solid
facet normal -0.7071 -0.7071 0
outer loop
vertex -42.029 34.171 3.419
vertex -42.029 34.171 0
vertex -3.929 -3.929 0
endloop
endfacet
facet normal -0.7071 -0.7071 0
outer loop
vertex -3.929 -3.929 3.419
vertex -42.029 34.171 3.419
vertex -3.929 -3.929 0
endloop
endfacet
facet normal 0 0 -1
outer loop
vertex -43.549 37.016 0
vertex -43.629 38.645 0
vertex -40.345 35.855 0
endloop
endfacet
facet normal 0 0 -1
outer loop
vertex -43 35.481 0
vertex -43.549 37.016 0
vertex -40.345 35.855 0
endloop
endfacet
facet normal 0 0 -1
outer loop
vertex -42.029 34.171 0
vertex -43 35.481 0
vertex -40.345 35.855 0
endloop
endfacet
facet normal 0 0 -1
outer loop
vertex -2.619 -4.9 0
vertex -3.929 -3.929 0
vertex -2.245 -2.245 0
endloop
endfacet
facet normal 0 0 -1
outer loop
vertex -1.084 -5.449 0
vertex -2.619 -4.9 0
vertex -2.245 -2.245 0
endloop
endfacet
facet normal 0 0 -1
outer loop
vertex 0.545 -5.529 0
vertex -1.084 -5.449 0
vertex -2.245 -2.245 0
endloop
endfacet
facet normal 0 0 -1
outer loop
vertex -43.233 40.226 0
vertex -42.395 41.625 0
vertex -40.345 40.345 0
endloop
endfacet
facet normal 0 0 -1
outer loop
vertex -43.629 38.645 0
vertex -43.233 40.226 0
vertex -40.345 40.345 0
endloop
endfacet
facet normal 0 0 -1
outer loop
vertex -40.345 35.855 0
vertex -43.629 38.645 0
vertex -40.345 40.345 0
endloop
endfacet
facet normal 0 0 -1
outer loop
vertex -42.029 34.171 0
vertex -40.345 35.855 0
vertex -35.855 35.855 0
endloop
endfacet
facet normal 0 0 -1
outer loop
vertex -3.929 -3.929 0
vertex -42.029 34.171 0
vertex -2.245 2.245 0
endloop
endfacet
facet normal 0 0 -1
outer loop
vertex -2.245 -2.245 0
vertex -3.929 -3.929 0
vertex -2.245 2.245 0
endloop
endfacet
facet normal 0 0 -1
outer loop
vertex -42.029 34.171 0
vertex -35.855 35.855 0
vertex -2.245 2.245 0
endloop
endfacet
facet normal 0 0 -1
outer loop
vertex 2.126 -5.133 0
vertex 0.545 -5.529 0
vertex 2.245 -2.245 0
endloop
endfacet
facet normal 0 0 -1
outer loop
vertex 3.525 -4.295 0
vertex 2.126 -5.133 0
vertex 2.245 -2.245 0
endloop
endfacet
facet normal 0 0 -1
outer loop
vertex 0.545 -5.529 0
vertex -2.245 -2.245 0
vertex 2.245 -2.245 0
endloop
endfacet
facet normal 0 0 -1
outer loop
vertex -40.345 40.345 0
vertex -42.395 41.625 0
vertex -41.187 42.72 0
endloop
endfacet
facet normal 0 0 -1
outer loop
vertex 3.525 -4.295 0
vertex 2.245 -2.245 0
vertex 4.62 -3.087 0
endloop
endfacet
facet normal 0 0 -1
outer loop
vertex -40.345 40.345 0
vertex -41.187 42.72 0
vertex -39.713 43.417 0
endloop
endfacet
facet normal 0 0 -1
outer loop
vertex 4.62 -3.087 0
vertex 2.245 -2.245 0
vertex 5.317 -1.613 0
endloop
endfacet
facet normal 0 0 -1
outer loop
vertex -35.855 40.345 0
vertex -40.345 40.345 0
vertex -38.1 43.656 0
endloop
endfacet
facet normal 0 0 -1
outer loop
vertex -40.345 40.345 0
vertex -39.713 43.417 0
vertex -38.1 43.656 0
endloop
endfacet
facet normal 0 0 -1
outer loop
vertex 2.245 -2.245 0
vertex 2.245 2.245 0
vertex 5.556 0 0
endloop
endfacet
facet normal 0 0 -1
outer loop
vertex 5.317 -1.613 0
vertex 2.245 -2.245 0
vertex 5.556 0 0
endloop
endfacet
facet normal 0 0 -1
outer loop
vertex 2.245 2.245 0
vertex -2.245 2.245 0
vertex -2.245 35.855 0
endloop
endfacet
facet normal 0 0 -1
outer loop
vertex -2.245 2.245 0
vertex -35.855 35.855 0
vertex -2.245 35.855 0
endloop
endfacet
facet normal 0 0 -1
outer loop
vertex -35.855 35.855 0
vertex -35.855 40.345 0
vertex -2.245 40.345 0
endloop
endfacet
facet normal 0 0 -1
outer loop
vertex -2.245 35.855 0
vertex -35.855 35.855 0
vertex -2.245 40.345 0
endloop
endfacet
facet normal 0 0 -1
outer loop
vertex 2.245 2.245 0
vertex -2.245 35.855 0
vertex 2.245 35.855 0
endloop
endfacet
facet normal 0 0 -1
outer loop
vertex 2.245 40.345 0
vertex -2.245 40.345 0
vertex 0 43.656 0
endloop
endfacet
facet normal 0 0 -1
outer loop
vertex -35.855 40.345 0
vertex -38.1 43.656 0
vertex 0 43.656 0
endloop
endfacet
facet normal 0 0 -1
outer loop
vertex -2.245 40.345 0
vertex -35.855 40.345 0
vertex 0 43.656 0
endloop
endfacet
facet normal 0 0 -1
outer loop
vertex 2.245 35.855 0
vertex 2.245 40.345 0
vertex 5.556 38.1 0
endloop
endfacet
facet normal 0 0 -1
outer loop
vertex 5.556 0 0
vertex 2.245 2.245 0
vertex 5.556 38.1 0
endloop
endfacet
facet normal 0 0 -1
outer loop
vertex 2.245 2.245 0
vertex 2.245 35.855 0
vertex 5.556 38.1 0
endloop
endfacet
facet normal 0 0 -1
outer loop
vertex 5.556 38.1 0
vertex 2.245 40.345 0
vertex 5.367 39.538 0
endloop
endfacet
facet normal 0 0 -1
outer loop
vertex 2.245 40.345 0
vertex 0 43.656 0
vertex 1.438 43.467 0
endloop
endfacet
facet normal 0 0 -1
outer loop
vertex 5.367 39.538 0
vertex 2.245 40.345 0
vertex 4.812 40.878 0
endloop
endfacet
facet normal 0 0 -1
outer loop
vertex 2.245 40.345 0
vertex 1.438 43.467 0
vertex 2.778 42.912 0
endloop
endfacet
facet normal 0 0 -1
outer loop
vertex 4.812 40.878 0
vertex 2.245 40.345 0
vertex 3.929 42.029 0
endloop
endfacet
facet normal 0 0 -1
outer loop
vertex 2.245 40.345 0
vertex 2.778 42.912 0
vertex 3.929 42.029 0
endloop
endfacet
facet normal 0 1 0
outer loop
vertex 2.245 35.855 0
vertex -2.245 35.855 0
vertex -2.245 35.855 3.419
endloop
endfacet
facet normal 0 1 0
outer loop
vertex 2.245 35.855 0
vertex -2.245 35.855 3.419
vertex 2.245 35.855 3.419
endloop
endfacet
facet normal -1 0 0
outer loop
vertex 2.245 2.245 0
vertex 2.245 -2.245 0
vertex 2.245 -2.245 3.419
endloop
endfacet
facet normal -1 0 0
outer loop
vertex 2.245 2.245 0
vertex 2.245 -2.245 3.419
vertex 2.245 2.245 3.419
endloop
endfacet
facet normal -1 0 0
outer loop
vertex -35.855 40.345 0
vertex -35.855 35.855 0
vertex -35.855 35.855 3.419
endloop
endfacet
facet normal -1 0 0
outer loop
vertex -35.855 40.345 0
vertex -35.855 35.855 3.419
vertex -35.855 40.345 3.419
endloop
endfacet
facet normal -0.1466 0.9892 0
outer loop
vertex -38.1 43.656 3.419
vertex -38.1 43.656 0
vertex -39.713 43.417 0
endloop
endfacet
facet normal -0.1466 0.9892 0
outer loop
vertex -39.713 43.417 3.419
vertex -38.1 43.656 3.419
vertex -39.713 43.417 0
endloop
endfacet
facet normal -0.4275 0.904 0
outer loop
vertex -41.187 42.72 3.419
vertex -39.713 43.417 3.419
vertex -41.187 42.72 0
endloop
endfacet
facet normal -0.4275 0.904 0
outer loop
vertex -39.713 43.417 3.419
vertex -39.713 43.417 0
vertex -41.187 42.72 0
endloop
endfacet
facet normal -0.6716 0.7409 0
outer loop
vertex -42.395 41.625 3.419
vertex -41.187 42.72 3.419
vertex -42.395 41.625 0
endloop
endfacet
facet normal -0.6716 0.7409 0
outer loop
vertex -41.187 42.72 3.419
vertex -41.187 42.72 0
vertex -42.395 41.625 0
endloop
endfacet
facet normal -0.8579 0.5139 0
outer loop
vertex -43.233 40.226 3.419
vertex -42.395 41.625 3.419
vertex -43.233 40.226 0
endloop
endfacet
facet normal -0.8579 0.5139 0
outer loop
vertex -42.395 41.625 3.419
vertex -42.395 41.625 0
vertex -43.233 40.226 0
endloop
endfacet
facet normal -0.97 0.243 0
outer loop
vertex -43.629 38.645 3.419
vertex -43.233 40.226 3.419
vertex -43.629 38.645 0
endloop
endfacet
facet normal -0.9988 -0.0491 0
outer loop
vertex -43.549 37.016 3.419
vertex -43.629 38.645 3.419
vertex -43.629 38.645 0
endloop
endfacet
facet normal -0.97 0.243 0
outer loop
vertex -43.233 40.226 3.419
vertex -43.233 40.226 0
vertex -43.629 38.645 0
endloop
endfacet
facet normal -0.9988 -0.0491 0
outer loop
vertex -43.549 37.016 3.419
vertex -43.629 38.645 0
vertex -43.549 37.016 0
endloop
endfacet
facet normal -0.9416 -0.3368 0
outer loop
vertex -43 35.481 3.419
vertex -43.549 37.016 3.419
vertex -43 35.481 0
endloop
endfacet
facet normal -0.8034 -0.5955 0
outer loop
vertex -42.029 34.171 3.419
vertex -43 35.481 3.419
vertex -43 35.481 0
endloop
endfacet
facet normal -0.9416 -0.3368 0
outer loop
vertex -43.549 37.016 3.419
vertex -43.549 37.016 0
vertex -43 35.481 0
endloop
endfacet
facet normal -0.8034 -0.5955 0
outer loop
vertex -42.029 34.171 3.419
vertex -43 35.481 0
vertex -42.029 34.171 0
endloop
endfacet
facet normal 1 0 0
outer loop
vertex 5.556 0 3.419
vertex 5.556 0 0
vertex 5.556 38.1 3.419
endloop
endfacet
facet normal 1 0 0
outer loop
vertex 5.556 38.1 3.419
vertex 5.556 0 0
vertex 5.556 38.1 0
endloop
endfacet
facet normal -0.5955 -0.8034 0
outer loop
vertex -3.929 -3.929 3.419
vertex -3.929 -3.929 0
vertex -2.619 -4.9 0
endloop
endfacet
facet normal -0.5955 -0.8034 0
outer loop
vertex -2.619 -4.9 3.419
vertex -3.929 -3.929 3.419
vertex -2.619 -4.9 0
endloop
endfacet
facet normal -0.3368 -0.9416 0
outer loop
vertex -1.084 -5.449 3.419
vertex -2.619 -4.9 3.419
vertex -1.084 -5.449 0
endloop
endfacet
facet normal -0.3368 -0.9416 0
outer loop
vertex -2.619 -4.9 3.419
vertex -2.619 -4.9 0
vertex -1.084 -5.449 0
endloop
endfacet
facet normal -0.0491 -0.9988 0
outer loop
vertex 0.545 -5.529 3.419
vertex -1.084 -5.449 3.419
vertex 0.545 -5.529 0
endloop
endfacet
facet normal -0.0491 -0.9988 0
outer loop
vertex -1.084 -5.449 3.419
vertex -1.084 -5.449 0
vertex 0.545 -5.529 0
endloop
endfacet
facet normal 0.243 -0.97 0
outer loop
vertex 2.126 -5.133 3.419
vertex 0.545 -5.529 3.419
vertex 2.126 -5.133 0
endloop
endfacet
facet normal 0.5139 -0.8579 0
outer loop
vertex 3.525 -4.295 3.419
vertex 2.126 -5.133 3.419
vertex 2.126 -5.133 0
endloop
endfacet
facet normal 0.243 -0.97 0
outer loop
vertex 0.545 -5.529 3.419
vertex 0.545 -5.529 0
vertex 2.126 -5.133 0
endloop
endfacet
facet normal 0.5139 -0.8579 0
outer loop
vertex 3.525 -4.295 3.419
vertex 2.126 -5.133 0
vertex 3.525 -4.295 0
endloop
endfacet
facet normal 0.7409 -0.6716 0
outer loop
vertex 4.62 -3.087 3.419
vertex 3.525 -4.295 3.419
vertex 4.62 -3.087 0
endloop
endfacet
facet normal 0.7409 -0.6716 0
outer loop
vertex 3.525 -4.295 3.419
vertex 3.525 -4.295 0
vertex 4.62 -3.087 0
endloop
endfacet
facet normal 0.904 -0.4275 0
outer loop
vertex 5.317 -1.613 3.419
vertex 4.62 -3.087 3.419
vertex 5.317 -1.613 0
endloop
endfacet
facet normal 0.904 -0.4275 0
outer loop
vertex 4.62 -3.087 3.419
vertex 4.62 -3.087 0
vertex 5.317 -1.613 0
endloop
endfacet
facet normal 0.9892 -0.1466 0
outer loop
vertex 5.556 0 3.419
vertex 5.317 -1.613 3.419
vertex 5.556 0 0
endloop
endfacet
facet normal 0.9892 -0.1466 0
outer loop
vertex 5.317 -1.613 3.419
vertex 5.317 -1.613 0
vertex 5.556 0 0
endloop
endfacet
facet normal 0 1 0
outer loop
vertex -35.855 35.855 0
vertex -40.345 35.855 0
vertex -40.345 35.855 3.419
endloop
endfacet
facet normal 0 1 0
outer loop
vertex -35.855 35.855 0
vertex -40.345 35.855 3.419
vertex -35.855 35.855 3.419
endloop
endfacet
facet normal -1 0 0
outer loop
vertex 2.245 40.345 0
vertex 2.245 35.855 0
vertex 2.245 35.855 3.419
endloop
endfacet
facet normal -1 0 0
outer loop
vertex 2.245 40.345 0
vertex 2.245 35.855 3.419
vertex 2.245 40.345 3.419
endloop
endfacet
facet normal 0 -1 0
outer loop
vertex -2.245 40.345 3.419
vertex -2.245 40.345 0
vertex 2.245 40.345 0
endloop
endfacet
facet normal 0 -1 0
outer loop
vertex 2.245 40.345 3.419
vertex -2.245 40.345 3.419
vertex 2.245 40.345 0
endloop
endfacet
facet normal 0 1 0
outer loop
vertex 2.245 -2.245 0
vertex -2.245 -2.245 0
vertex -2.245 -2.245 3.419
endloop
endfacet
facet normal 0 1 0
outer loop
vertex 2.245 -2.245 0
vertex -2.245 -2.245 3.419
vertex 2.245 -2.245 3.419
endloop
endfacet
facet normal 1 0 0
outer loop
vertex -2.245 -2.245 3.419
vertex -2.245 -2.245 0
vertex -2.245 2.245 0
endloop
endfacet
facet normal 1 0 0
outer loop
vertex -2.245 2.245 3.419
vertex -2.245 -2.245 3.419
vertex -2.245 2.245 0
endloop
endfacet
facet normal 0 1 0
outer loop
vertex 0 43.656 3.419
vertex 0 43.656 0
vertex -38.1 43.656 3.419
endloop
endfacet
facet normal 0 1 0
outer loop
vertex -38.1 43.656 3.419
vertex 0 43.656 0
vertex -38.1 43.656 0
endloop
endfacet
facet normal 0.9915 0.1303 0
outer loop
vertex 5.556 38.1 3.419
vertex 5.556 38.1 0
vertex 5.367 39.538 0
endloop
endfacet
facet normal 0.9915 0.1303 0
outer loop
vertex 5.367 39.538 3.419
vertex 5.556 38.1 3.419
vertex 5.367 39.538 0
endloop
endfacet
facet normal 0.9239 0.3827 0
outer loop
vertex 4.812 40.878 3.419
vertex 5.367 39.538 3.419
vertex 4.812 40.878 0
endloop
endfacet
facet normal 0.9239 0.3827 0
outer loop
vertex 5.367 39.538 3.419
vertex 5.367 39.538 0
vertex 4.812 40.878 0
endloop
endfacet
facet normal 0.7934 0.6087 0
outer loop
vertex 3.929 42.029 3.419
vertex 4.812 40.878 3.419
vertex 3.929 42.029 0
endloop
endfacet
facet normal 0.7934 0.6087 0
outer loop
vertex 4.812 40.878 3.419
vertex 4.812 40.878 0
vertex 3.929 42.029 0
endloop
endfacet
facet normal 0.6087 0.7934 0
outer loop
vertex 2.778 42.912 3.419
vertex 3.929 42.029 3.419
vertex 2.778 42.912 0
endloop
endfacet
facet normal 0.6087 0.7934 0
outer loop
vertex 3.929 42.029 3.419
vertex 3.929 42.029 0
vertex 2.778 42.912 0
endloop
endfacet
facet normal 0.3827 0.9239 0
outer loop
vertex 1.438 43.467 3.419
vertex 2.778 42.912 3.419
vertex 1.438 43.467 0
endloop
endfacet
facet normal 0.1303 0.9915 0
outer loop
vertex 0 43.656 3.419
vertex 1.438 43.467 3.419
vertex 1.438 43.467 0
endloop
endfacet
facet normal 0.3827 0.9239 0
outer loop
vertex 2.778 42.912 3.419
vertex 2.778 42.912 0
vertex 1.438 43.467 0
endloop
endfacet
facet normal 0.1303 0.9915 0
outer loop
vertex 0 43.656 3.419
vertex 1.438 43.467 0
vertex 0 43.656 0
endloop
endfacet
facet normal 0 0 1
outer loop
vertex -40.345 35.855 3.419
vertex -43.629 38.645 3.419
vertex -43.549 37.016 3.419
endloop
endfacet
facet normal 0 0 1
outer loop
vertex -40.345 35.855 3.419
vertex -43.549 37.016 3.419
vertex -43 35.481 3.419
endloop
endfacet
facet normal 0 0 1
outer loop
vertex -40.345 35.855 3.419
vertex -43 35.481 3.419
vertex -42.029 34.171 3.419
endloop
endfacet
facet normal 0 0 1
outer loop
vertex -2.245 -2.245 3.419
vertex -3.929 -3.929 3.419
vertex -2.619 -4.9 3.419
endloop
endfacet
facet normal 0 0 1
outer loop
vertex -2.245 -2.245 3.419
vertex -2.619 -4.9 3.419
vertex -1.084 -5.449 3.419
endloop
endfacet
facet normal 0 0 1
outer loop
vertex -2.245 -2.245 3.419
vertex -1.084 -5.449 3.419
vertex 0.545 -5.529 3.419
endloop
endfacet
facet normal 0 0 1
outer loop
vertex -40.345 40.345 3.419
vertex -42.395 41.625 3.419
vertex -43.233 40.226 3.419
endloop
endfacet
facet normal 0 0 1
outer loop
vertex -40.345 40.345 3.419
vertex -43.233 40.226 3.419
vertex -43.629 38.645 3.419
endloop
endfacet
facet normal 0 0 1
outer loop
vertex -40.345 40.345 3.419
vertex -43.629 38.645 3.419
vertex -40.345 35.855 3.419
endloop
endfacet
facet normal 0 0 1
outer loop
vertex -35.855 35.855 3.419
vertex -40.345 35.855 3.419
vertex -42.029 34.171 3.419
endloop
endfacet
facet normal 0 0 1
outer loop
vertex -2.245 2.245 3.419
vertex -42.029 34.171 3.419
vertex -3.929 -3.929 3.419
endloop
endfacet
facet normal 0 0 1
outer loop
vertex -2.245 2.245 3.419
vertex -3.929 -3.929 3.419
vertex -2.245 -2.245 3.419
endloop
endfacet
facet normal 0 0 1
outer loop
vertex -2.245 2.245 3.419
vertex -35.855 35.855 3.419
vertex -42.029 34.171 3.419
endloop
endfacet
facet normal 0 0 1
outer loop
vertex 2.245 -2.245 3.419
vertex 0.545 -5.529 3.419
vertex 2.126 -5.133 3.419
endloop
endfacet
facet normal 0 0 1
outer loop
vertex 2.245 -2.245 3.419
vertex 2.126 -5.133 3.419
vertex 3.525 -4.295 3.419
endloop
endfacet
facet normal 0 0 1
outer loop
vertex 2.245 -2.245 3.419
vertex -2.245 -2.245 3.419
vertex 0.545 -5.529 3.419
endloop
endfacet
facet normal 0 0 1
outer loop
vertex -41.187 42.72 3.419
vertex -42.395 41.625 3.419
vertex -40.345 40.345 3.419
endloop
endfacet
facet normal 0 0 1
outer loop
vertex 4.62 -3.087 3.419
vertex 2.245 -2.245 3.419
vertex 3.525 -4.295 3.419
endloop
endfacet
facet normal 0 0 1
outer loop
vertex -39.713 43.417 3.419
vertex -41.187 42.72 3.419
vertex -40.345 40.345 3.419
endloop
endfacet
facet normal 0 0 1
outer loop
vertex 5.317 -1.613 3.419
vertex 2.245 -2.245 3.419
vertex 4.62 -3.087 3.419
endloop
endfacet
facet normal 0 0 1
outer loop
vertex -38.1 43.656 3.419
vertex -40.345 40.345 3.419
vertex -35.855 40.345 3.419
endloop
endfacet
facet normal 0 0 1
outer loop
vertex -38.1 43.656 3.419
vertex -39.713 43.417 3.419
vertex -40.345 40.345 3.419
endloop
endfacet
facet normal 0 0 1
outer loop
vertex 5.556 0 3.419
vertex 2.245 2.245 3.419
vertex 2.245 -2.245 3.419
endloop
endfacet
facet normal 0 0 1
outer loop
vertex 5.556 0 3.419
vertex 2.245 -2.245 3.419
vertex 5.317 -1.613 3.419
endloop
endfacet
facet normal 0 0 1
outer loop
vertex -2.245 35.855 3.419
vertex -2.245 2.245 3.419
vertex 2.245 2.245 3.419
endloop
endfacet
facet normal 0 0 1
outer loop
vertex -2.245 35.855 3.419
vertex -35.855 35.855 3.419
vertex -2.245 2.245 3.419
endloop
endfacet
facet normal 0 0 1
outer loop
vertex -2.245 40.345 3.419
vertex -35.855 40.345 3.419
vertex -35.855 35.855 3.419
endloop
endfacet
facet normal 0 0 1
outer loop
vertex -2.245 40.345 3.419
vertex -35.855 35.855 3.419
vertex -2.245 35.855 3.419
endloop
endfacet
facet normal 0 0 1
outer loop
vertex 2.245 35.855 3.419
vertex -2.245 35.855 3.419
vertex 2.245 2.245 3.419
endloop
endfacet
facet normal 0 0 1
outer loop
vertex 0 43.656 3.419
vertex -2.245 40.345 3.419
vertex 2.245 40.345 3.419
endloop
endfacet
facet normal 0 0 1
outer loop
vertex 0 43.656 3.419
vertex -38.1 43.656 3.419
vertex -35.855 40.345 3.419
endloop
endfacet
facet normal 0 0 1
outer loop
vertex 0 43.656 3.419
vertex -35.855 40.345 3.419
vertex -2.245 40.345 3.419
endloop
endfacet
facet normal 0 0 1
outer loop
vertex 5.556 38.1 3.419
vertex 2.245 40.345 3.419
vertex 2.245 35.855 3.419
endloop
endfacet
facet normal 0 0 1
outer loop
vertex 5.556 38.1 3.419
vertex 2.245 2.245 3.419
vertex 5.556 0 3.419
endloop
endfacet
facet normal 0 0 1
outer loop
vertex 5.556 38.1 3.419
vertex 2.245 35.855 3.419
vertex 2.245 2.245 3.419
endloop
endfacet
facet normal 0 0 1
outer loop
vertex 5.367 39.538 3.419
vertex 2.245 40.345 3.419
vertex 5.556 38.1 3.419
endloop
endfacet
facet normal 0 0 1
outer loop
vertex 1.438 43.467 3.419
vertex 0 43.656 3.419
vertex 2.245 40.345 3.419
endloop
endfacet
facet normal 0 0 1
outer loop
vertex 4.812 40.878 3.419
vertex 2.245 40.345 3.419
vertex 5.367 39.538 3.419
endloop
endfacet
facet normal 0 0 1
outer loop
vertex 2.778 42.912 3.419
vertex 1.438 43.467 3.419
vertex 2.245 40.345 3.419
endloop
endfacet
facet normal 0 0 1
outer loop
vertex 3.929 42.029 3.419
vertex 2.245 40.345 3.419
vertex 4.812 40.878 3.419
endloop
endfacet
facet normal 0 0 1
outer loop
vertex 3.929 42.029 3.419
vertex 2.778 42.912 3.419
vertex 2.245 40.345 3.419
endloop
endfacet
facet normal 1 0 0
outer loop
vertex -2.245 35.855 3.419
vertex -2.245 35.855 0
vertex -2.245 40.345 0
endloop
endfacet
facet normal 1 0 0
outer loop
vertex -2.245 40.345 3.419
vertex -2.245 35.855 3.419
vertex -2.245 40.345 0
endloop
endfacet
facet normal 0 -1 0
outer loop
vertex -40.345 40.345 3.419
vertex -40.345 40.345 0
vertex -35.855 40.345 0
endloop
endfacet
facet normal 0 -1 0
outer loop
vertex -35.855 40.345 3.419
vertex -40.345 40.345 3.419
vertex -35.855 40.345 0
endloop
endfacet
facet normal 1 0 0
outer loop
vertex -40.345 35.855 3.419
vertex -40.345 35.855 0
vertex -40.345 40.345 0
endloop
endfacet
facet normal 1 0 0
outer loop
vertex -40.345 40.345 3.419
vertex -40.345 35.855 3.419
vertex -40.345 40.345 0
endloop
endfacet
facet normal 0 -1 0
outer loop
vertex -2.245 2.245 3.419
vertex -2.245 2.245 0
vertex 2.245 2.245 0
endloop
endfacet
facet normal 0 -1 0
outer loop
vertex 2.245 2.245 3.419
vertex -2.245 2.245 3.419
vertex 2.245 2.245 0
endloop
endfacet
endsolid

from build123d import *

# Parameters (mm, degrees)
F0_W     = 4.490128
F0_H     = 4.490128
F1_DEPTH = 3.41884


with BuildPart() as f1:
    # F0 (on Top) → F1 (new body)
    with BuildSketch(Plane.XY):
        with BuildLine():
            Line((5.55625, 0), (5.55625, 38.1))
            ThreePointArc((5.55625, 38.1), (3.928862, 42.028862), (0, 43.65625))
            Line((0, 43.65625), (-38.1, 43.65625))
            ThreePointArc((-38.1, 43.65625), (-43.233306, 40.226285), (-42.028862, 34.171138))
            Line((-42.028862, 34.171138), (-3.928862, -3.928862))
            ThreePointArc((-3.928862, -3.928862), (2.126285, -5.133306), (5.55625, 0))
        make_face()
        Rectangle(F0_W, F0_H, mode=Mode.SUBTRACT)
        with Locations((-38.1, 38.1)):
            Rectangle(F0_W, F0_H, mode=Mode.SUBTRACT)
        with Locations((0, 38.1)):
            Rectangle(F0_W, F0_H, mode=Mode.SUBTRACT)
    extrude(amount=F1_DEPTH)


solid = f1.part
